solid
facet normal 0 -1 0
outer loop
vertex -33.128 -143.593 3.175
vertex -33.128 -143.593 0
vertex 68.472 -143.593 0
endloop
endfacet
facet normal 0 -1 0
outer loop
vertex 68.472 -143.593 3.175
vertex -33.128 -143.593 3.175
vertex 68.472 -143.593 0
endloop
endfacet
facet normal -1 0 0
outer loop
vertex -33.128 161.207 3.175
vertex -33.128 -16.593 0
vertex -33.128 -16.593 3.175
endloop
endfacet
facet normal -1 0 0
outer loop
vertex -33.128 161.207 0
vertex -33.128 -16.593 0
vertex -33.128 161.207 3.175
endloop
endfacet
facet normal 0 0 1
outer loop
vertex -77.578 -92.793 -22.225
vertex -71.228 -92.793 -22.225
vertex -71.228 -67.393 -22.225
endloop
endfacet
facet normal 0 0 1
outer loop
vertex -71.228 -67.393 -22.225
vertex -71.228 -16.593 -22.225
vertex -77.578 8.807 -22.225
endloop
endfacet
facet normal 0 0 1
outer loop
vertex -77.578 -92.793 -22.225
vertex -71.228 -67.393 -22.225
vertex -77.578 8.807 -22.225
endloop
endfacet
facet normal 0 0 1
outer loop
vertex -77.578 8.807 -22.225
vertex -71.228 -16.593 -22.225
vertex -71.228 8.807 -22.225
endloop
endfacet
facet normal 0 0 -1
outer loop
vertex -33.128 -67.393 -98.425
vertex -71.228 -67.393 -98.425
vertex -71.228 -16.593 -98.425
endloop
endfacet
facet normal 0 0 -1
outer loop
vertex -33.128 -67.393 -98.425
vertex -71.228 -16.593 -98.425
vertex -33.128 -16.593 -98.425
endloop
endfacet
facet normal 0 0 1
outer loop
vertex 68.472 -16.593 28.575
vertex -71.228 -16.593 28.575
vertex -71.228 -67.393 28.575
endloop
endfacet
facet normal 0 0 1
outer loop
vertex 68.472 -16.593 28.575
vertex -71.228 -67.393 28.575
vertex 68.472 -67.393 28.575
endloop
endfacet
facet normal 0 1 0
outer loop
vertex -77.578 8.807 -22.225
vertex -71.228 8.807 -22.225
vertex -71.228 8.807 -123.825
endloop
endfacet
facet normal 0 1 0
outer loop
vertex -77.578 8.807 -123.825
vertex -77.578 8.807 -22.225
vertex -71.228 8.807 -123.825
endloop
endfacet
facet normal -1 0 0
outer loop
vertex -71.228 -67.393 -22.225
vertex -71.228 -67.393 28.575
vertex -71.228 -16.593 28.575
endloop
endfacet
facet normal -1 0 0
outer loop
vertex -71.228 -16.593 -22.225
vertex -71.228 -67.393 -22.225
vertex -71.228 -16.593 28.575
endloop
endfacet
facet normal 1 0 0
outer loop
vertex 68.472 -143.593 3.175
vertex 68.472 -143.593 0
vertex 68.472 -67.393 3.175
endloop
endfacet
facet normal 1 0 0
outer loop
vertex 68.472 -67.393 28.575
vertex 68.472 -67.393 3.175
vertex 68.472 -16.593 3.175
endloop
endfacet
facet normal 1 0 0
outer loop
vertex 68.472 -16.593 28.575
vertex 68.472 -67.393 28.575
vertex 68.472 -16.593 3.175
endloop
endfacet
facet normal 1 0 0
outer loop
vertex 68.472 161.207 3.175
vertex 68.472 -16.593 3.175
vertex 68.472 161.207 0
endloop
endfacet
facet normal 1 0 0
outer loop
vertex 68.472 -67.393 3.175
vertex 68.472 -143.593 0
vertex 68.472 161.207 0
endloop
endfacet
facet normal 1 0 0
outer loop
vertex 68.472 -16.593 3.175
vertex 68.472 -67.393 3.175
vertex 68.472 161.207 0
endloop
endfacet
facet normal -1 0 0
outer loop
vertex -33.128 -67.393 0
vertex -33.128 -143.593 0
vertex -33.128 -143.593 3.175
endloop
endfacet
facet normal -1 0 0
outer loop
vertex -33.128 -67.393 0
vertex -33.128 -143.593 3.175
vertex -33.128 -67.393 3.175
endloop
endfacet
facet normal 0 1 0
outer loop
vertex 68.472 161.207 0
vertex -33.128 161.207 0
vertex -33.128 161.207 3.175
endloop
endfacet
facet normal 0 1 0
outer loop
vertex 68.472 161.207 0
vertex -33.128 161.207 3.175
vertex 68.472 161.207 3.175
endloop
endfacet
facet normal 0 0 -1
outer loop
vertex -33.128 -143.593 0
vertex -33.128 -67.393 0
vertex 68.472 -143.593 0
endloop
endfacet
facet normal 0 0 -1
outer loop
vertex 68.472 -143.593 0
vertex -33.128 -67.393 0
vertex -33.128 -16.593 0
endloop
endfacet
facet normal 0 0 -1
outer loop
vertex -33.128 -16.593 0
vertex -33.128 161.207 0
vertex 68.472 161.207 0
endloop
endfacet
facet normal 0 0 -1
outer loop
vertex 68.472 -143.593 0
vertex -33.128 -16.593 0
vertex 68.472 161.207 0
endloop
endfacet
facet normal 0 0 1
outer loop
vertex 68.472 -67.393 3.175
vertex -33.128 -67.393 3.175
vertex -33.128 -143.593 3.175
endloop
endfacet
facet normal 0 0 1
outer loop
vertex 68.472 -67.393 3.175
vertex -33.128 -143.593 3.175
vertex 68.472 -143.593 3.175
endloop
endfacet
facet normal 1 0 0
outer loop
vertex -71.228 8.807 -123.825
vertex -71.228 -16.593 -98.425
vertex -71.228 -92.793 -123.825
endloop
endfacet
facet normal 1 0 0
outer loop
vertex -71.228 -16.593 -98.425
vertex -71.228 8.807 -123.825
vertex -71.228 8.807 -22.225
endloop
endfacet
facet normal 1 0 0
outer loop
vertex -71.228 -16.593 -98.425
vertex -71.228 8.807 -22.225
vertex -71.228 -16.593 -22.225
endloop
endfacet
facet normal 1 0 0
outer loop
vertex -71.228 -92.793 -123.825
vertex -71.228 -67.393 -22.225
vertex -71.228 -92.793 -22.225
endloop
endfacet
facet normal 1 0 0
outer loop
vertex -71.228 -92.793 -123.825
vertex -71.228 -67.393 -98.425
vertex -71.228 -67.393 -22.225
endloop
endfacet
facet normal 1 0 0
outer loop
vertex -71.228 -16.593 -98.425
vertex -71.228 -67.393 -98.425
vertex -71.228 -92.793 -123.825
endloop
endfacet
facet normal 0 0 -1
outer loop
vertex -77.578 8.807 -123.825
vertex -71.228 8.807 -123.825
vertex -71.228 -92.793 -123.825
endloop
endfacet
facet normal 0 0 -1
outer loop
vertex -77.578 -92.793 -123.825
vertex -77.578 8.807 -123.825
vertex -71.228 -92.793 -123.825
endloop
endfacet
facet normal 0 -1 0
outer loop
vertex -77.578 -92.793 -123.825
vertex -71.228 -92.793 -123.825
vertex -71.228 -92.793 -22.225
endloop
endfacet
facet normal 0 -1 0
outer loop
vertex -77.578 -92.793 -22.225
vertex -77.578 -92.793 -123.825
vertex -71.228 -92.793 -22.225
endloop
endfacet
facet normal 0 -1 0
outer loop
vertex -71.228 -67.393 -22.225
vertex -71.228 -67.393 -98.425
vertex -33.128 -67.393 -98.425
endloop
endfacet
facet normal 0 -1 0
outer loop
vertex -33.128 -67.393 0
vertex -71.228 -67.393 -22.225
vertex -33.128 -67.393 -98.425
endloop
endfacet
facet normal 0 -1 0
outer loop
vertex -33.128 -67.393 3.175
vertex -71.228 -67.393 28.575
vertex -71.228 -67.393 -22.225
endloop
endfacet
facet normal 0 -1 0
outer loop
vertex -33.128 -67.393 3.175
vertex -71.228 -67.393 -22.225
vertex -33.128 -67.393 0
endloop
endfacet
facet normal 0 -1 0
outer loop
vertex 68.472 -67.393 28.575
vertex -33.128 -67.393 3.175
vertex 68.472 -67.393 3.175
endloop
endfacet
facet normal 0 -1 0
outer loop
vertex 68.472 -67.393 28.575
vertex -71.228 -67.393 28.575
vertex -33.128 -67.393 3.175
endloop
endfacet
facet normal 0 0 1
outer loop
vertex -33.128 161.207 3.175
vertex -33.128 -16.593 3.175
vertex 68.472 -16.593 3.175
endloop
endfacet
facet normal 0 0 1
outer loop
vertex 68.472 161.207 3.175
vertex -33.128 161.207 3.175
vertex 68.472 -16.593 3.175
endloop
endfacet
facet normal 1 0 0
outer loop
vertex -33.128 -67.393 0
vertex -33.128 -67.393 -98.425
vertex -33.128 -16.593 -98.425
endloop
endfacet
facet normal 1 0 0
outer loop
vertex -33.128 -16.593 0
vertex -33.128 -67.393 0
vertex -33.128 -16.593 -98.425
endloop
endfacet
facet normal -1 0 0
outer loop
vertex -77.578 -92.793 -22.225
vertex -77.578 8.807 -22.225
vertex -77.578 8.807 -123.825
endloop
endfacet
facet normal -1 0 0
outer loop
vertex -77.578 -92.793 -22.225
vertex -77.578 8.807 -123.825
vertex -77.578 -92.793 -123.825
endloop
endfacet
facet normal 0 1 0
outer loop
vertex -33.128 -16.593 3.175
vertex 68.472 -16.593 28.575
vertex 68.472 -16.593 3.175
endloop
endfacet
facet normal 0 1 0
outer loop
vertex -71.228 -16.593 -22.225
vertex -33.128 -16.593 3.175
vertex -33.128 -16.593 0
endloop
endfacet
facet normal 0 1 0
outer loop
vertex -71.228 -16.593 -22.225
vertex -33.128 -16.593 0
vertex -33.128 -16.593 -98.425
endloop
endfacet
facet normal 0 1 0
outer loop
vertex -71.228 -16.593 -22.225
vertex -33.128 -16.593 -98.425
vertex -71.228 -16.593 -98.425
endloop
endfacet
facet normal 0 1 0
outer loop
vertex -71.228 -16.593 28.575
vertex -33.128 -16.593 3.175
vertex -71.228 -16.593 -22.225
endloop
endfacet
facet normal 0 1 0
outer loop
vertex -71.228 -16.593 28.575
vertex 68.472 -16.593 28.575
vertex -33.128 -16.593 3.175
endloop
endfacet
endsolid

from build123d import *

# Parameters (mm, degrees)
F0_W     = 101.6
F0_H     = 304.8
F1_DEPTH = 3.175
F2_W     = 38.1
F2_H     = 50.8
F2_W_2   = 101.6
F3_DEPTH = 25.4
F4_DEPTH = 101.6
F6_DEPTH = 6.35


# Not quite as in the source:
# - the program builds the solid bodies; features that only make, move or delete a surface that nothing else refers to are left out


with BuildPart() as f1:
    # F0 (on Top) → F1 (new body)
    with BuildSketch(Plane.XY):
        with Locations((17.6723517966, 8.8070686907)):
            Rectangle(F0_W, F0_H)
    extrude(amount=F1_DEPTH)

    # F2 (on face) → F3 (join)
    with BuildSketch(Plane.XY.offset(3.175)):
        with Locations((-52.1776482034, -41.9929313093)):
            Rectangle(F2_W, F2_H)
        with Locations((17.6723517966, -41.9929313093)):
            Rectangle(F2_W_2, F2_H)
    extrude(amount=F3_DEPTH)

    # F4 (add): a face of the model
    f4_faces = [f1.faces().sort_by_distance(p)[0] for p in [
        (-52.1776482034, -41.9929313093, 3.175),
    ]]
    extrude(f4_faces, amount=F4_DEPTH)

    # F5 (on face) → F6 (join)
    with BuildSketch(Plane(origin=(-71.2276482034, 0, 0), x_dir=(0, -1, 0), z_dir=(-1, 0, 0))):
        Polygon((92.7929313093, -123.825), (92.7929313093, -22.225), (67.3929313093, -22.225), (67.3929313093, -98.425), (41.9929313093, -98.425), (16.5929313093, -98.425), (16.5929313093, -22.225), (-8.8070686907, -22.225), (-8.8070686907, -123.825), align=None)
        Polygon((67.3929313093, -98.425), (67.3929313093, -22.225), (16.5929313093, -22.225), (16.5929313093, -98.425), (41.9929313093, -98.425), align=None)
    extrude(amount=F6_DEPTH)


solid = f1.part
